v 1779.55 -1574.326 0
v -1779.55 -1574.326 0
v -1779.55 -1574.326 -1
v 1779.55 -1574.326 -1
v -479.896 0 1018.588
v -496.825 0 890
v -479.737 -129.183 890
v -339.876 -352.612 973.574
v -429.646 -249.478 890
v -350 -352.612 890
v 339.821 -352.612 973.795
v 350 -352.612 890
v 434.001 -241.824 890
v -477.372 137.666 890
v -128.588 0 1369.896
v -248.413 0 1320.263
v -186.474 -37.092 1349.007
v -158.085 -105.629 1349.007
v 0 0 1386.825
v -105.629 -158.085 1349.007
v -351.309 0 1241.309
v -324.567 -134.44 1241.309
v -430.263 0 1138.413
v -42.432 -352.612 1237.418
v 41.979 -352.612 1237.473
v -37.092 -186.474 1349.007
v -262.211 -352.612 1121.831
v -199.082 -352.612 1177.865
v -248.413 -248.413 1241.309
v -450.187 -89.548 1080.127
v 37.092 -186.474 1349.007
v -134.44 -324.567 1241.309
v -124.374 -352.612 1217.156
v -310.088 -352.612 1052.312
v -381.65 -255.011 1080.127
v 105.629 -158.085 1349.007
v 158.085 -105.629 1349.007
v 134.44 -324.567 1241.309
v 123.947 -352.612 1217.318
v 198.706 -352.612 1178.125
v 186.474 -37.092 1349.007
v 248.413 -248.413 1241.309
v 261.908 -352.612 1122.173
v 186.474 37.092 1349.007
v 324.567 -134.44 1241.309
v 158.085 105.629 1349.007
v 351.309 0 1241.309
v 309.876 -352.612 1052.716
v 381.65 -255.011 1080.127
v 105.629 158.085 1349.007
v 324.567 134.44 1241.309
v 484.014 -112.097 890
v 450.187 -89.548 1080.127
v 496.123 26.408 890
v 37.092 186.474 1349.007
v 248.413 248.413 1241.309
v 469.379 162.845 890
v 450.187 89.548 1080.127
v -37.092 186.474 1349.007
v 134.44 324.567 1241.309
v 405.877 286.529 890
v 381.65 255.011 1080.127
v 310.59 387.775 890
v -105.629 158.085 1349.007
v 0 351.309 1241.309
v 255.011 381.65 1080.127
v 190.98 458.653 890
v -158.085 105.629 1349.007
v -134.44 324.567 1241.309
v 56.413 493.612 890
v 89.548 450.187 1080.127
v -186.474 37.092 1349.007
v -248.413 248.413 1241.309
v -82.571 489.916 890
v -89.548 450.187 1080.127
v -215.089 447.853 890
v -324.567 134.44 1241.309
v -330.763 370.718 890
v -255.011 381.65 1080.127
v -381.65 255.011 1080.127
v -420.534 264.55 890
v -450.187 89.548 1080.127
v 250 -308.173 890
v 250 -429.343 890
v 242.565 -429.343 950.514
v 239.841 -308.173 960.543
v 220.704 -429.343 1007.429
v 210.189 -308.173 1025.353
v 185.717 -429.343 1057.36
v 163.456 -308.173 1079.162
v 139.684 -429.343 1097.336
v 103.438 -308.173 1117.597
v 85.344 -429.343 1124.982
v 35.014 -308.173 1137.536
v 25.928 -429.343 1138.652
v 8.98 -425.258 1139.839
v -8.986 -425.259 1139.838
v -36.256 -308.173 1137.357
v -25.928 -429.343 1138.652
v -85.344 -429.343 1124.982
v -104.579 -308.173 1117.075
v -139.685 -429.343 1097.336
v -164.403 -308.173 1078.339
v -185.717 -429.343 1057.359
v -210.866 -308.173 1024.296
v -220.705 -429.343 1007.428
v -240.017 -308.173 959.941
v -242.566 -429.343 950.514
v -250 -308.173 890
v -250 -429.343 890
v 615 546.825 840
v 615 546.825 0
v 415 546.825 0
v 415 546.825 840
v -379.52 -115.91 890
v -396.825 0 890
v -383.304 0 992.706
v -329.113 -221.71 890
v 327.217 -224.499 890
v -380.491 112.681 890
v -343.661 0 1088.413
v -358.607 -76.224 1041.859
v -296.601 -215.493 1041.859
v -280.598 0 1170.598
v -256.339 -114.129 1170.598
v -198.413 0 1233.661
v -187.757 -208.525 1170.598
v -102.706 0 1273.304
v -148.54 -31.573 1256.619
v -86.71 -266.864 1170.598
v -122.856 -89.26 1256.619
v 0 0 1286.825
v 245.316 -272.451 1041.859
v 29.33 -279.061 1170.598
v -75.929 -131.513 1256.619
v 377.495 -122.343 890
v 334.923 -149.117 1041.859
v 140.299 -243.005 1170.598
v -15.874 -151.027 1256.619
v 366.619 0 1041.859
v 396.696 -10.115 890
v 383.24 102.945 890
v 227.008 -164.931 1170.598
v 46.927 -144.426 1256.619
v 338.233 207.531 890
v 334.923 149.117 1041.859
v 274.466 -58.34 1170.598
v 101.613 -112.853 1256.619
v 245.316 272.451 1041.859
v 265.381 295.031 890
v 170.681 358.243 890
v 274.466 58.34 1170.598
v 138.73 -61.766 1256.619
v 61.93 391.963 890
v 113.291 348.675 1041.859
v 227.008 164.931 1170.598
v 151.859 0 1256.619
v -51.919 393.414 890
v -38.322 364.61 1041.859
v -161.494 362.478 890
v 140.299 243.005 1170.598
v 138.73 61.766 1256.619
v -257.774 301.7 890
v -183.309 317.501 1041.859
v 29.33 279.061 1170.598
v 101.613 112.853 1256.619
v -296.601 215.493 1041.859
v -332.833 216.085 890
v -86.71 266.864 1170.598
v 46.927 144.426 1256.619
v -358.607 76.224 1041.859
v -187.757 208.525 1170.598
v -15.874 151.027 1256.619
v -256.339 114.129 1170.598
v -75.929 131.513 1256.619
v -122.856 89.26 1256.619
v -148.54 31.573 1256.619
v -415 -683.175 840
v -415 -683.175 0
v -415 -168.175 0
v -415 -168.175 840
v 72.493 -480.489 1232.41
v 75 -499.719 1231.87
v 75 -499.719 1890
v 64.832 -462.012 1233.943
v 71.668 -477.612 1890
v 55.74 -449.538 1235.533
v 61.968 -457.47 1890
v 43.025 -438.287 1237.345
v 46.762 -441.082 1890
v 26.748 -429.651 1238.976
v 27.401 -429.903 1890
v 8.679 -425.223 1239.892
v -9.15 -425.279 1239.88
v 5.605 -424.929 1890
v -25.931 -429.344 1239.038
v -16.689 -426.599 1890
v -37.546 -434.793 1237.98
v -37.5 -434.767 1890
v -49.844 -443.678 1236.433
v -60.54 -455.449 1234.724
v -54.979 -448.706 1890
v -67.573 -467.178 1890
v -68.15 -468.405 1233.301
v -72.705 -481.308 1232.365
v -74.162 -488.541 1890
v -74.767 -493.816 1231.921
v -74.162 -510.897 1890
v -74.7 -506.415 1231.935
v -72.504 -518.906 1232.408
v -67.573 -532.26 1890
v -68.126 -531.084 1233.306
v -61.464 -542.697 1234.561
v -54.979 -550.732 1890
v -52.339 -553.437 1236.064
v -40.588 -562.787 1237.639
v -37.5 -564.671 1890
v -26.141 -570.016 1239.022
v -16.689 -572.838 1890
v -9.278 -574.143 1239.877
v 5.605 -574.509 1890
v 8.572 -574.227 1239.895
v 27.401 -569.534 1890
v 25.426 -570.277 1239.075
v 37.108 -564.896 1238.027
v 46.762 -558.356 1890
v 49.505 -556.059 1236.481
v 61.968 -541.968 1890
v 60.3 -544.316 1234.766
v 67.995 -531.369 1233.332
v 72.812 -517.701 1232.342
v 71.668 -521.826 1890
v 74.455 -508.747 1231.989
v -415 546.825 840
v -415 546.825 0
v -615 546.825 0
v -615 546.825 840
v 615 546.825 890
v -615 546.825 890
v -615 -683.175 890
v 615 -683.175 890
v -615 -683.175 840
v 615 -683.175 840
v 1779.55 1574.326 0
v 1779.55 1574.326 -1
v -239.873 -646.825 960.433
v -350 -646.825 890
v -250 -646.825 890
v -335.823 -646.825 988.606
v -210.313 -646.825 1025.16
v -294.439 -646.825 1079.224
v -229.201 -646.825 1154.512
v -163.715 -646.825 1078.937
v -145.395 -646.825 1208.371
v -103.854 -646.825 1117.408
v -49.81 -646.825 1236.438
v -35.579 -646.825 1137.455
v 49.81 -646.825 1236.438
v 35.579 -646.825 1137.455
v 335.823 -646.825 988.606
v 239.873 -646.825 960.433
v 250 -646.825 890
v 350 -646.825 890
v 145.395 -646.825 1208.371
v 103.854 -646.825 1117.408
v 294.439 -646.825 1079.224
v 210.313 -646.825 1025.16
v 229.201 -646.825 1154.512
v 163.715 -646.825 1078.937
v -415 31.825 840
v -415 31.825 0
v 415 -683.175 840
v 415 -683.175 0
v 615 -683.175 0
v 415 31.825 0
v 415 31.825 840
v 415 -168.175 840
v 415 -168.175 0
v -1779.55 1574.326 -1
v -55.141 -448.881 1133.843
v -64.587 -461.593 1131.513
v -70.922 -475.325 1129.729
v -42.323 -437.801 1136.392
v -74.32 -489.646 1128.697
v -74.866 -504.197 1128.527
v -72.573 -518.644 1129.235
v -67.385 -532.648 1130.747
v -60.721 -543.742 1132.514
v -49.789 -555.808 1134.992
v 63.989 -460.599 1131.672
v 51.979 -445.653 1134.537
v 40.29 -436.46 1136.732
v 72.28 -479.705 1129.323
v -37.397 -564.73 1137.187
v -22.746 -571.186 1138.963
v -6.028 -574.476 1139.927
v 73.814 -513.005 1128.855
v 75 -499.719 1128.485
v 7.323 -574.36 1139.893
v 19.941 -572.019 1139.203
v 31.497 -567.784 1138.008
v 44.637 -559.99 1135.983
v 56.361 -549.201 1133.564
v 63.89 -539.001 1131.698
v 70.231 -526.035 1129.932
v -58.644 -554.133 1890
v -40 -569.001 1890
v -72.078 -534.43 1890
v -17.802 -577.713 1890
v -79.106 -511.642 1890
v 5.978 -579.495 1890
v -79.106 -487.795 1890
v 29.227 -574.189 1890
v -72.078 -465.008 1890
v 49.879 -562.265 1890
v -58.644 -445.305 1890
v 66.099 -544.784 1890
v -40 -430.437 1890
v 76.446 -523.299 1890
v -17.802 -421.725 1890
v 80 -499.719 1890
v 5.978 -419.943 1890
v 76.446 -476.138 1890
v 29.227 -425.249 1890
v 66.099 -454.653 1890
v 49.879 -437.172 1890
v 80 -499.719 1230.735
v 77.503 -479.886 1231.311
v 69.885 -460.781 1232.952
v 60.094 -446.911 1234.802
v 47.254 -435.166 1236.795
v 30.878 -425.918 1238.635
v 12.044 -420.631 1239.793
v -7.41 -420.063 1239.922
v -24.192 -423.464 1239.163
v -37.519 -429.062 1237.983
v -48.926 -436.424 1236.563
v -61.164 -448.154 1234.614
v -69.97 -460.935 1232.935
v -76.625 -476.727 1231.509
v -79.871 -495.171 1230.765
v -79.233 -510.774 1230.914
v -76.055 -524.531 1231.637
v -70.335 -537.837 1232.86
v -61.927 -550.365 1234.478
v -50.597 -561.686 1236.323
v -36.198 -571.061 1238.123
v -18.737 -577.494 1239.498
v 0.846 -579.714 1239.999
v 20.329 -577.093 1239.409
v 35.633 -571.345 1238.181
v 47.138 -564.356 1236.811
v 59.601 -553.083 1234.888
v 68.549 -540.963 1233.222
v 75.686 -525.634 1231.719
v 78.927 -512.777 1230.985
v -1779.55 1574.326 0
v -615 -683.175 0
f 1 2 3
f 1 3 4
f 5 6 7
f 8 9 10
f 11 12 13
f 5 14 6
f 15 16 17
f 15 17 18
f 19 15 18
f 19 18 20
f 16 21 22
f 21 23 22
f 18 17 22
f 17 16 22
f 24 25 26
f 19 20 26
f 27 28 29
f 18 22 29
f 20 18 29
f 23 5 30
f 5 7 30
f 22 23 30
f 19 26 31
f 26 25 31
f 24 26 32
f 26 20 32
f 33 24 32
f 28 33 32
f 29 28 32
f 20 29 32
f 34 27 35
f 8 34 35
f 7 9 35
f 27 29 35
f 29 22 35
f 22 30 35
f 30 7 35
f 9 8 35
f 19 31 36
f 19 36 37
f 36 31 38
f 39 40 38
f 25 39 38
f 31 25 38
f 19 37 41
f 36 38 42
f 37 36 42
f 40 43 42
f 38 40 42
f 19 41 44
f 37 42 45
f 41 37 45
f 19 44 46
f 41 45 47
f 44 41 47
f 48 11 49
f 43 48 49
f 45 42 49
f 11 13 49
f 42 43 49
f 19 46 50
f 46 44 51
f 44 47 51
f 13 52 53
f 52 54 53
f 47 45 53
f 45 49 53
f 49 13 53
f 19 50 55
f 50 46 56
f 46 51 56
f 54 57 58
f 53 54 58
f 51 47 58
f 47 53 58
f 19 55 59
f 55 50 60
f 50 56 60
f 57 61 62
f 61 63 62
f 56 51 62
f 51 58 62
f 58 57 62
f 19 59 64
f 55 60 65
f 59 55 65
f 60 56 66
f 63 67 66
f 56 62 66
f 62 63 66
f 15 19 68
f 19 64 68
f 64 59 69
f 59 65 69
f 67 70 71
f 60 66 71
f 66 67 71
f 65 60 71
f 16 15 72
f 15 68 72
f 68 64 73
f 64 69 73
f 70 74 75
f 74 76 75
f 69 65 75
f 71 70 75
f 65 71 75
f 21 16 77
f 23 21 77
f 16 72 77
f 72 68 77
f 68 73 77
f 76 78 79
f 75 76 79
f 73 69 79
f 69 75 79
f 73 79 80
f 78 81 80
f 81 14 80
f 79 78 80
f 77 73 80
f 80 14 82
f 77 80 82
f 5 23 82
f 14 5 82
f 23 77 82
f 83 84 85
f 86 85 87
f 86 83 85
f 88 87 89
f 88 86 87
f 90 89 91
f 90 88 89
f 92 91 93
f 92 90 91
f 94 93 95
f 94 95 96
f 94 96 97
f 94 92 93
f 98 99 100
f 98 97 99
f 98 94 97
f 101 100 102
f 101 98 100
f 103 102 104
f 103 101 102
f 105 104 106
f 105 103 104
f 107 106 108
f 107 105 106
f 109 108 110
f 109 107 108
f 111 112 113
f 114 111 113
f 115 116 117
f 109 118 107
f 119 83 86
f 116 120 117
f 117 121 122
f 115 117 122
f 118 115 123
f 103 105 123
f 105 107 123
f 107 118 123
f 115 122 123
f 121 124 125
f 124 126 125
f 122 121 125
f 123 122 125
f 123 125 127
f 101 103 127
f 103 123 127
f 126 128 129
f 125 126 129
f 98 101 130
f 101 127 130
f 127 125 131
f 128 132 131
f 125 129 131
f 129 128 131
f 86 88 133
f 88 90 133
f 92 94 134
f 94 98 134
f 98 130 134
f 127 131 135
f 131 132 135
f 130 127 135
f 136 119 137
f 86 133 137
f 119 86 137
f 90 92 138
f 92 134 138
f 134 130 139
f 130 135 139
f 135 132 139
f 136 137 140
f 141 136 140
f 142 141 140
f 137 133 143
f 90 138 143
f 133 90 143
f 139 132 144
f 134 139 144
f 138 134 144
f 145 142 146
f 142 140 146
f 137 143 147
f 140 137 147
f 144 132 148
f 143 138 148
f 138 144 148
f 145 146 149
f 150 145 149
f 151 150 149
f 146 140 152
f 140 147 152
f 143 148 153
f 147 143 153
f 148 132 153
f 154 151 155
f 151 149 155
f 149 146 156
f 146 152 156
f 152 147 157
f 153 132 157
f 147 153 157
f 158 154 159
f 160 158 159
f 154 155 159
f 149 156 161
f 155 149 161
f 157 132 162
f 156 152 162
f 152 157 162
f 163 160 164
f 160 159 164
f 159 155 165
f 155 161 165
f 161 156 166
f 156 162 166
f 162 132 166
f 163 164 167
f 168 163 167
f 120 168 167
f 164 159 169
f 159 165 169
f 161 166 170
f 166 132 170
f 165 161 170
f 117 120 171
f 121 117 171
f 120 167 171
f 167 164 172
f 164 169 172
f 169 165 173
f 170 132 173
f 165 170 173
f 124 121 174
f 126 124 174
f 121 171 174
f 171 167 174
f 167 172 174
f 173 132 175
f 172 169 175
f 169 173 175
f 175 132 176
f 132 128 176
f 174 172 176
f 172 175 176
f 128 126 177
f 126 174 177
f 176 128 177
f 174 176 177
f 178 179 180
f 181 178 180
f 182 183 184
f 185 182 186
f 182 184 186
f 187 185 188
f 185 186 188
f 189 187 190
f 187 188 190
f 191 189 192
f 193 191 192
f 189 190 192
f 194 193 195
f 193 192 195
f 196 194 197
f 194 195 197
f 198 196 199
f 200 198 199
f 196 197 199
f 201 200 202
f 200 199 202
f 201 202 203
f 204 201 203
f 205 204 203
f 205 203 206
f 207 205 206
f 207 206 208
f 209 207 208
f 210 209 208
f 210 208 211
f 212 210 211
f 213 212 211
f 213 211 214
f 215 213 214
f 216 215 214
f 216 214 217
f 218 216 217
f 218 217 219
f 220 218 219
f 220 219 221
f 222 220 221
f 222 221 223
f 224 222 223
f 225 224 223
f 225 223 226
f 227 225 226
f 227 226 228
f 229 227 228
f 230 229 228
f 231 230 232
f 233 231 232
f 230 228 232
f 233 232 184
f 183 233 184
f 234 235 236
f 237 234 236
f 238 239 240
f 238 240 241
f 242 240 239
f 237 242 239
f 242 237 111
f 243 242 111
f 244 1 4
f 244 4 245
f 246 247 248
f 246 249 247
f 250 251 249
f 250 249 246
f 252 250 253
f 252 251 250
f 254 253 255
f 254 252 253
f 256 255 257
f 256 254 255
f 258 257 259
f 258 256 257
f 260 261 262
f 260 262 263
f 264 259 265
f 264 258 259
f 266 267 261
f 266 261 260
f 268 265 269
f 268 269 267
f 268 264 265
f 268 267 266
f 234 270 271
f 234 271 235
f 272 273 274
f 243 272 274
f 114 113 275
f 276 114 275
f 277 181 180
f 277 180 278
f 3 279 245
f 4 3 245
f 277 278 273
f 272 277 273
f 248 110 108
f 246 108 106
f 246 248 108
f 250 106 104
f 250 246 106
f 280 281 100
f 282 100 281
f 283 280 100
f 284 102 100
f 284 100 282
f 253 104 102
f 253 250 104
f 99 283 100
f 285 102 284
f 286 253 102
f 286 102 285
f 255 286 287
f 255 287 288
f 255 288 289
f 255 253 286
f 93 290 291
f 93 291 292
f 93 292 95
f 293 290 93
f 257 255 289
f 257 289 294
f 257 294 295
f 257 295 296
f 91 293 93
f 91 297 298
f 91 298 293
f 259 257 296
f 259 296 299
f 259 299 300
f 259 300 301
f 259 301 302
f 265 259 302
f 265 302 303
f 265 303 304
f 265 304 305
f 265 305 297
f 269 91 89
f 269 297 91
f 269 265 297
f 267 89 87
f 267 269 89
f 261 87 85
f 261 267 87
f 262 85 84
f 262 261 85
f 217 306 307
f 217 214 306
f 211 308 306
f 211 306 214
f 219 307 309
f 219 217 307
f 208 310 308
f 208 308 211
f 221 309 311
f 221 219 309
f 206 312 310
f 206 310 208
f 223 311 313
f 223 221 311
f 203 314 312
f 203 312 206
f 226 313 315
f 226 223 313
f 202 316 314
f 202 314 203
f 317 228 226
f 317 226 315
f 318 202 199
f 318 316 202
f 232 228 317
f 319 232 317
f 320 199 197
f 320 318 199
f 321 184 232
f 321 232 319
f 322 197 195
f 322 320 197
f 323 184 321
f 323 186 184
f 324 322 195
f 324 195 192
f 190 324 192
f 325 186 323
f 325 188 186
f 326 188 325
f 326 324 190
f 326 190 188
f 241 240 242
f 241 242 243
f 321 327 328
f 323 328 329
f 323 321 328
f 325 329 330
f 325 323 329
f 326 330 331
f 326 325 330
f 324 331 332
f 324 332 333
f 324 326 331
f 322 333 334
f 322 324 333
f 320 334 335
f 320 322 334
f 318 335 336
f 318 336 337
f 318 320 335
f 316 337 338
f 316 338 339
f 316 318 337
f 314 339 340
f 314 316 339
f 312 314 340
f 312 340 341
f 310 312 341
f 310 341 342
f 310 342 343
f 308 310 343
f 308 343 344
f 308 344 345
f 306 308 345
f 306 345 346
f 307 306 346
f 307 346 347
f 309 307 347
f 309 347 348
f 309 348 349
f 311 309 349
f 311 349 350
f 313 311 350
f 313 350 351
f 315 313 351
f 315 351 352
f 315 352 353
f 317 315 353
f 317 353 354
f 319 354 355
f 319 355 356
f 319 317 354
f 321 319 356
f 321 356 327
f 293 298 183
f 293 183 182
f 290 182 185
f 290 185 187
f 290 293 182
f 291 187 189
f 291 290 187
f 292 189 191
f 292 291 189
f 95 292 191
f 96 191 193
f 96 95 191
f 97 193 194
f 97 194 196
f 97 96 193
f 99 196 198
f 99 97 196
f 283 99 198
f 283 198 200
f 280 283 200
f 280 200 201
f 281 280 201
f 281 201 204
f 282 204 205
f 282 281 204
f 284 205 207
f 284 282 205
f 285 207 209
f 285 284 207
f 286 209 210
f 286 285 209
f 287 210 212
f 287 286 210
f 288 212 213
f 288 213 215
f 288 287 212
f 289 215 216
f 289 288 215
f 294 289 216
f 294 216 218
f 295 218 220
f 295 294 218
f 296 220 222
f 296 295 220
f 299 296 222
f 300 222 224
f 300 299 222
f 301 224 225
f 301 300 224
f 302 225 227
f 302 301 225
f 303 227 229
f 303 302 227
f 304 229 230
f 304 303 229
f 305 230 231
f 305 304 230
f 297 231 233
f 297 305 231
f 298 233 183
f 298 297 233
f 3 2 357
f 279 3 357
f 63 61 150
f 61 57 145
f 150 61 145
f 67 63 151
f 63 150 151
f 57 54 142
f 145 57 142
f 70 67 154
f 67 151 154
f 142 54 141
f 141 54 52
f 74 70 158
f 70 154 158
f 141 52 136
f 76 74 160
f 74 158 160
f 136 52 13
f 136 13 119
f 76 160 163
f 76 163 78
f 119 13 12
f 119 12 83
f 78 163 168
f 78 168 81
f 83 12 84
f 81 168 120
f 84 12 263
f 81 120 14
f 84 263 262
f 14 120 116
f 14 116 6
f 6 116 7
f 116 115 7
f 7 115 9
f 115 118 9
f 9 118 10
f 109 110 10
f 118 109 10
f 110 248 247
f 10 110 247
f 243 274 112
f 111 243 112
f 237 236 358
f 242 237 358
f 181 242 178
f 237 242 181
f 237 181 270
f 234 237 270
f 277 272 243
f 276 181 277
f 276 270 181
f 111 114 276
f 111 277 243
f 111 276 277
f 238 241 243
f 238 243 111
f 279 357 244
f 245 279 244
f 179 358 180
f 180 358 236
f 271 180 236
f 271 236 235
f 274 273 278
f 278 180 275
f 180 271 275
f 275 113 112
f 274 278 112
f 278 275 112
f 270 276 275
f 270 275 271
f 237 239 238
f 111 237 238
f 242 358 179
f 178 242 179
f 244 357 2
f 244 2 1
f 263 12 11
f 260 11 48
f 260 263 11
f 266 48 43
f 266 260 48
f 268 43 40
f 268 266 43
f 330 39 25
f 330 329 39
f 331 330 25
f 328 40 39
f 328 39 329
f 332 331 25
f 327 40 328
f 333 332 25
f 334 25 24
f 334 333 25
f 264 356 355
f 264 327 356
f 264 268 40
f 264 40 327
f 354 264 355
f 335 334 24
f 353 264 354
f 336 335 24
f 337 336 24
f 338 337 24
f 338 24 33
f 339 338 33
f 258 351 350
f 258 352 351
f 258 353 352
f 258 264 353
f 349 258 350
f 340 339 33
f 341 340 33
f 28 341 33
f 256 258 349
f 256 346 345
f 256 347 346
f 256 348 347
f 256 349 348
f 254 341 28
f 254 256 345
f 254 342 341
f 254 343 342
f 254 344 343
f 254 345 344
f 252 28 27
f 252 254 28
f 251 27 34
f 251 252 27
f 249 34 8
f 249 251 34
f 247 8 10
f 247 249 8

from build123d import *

# Parameters (mm, degrees)
F12_DEPTH = 496.8263968254
F16_R     = 75
F17_DEPTH = 351.0000000992
F19_R     = 80
F19_R_2   = 75
F20_DEPTH = 660.265499352
F21_W     = 1230
F21_H     = 1230
F22_DEPTH = 50
F23_W     = 3559.0991973877
F23_H     = 3148.6513614655
F24_DEPTH = 1
F26_DEPTH = 840


with BuildPart() as f10:
    # F9 (on Front) → F10 (revolve)
    with BuildSketch(Plane.XZ):
        with BuildLine():
            Line((-496.8253968254, 890), (-396.8253968254, 890))
            ThreePointArc((-396.8253968254, 890), (-280.5979290423, 1170.5979290423), (0, 1286.8253968254))
            Line((0, 1286.8253968254), (0, 1386.8253968254))
            ThreePointArc((0, 1386.8253968254), (-351.3086071609, 1241.3086071609), (-496.8253968254, 890))
        make_face()
    revolve(axis=Axis((0, 0, 1037.9446418654), (0, 0, 1)))

    # F11 (on Front) → F12 (cut, through all)
    with BuildSketch(Plane.XZ):
        with BuildLine():
            ThreePointArc((250, 890), (0, 1140), (-250, 890))
            Line((-250, 890), (250, 890))
        make_face()
    extrude(amount=F12_DEPTH, mode=Mode.SUBTRACT)

    # F14 (on offset) → F15 (join, up to the next surface of F10)
    with BuildSketch(Plane.XZ.offset(646.8253968254)):
        with BuildLine():
            Line((-350, 890), (-250, 890))
            ThreePointArc((-250, 890), (0, 1140), (250, 890))
            Line((250, 890), (350, 890))
            ThreePointArc((350, 890), (0, 1240), (-350, 890))
        make_face()
    extrude(until=Until.NEXT, dir=(0, 1, 0))

    # F16 (on offset) → F17 (cut, up to face)
    with BuildSketch(Plane.XY.offset(890)):
        with Locations((0, -499.7188773534)):
            Circle(F16_R)
    extrude(amount=F17_DEPTH, mode=Mode.SUBTRACT)

    # F19 (on offset) → F20 (join, up to face)
    with BuildSketch(Plane.XY.offset(1890)):
        with Locations((0, -499.7188773534)):
            Circle(F19_R)
        with Locations((0, -499.7188773534)):
            Circle(F19_R_2, mode=Mode.SUBTRACT)
    extrude(amount=-F20_DEPTH)


with BuildPart() as f22:
    # F21 (on offset) → F22 (new body)
    with BuildSketch(Plane.XY.offset(890)):
        with Locations((0, -68.1746031746)):
            Rectangle(F21_W, F21_H)
    extrude(amount=-F22_DEPTH)


with BuildPart() as f24:
    # F23 (on Top) → F24 (new body)
    with BuildSketch(Plane.XY):
        Rectangle(F23_W, F23_H)
    extrude(amount=-F24_DEPTH)


with BuildPart() as f26:
    # F25 (on Top) → F26 (new body)
    with BuildSketch(Plane.XY):
        Polygon((-415, 546.8253968254), (-615, 546.8253968254), (-615, -683.1746031746), (-415, -683.1746031746), (-415, -168.1746031746), (415, -168.1746031746), (415, -683.1746031746), (615, -683.1746031746), (615, 546.8253968254), (415, 546.8253968254), (415, 31.8253968254), (-415, 31.8253968254), align=None)
    extrude(amount=F26_DEPTH)


solid = Compound([f10.part, f22.part, f24.part, f26.part])
